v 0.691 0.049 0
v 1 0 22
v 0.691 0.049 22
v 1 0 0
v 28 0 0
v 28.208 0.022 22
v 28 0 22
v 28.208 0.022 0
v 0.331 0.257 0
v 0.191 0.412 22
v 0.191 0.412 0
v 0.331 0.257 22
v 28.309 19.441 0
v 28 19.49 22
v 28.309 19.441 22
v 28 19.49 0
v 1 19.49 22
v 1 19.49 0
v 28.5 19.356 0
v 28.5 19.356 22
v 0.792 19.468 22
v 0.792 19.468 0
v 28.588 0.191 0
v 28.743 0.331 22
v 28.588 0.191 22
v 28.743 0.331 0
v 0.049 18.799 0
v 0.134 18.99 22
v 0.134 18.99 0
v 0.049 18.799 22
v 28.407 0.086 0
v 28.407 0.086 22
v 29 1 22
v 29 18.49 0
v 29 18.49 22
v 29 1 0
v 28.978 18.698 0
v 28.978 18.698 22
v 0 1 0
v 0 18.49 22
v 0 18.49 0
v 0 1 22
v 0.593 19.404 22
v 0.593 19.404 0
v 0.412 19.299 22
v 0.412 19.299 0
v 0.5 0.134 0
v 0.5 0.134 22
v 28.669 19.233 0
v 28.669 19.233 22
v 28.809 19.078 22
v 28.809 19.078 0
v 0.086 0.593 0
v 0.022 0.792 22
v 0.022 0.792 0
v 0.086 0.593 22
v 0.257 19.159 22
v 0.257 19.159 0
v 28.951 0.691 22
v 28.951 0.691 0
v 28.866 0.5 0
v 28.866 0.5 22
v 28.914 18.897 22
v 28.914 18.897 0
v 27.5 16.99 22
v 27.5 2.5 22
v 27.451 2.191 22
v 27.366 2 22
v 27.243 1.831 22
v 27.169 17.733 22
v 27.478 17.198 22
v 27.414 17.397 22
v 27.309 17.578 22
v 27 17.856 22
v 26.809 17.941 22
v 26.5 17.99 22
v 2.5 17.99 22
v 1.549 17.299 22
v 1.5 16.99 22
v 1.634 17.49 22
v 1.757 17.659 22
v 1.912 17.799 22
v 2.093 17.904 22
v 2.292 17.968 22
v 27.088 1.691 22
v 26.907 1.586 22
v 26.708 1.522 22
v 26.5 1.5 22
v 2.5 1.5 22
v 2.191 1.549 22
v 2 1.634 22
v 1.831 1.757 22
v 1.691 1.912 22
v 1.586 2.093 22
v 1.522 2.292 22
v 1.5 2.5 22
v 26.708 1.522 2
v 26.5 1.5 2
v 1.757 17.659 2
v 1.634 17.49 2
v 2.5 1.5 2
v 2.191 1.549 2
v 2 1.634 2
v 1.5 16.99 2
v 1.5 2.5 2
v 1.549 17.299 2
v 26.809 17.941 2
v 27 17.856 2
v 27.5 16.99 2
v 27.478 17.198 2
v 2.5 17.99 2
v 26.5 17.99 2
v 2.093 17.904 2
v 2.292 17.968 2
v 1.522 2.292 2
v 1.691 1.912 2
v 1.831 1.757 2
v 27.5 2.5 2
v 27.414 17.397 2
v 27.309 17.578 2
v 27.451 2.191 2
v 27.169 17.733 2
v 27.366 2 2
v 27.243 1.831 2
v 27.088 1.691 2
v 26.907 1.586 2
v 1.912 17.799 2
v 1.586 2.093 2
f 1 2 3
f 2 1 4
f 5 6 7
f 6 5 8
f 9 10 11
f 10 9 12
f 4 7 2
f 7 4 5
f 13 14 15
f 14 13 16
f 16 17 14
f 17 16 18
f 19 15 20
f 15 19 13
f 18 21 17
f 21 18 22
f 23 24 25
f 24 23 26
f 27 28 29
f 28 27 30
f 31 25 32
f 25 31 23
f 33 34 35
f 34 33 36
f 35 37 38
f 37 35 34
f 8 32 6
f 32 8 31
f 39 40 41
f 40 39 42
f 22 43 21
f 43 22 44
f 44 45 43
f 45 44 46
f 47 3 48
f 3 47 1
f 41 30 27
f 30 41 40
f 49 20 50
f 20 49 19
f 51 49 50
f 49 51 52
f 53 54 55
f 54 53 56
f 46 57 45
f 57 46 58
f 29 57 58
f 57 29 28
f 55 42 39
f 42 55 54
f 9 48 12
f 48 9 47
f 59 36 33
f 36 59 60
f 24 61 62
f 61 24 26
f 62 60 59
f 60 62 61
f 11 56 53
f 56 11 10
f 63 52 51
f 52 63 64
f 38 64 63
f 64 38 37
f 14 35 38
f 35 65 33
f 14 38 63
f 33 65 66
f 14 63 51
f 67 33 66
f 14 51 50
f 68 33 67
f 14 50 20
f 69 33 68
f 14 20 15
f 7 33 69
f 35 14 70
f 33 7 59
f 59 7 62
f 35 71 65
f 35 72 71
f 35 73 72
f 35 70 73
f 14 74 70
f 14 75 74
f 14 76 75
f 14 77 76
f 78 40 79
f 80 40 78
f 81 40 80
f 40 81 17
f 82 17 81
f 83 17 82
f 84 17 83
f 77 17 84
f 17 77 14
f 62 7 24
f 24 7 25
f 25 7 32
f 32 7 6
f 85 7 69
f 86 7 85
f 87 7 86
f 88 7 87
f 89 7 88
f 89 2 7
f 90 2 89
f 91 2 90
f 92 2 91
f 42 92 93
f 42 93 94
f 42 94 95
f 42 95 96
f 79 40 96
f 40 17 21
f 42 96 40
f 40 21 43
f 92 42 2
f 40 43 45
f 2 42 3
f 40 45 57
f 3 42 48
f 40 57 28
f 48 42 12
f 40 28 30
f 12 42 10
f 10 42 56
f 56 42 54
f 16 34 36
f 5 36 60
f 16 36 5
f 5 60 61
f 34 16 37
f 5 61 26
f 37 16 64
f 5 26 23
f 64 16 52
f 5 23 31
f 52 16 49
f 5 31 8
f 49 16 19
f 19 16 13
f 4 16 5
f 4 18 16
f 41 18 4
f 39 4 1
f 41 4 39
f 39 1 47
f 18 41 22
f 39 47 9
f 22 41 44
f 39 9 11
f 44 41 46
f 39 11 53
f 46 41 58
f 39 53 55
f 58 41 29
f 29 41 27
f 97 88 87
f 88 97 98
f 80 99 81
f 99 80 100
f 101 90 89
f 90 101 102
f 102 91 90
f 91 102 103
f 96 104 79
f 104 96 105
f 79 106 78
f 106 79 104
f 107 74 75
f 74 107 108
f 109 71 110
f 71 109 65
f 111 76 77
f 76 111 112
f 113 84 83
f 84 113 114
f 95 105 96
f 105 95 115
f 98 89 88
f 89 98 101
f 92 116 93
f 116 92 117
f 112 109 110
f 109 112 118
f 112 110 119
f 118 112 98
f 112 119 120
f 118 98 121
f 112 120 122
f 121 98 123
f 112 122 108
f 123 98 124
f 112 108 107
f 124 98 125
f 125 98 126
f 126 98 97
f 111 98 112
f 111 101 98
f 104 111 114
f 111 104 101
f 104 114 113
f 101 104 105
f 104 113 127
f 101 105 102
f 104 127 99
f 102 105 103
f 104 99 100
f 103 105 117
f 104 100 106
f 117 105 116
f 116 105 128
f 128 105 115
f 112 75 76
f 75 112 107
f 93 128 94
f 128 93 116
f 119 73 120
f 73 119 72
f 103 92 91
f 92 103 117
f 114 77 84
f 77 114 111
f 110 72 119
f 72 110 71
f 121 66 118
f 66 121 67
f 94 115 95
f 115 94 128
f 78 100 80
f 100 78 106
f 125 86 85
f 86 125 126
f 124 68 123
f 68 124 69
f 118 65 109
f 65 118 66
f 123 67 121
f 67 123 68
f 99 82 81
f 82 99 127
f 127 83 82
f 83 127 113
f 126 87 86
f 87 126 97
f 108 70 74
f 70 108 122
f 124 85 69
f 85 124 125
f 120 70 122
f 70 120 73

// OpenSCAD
// file: myTools.scad
module tube (r = 0, d = 0, l = 0, 
            thick = 0, 
            bCentered = true, 
            taper_pct = 0, 
            circlip = false) // r=radius d=dia l=length 
{
    assert( r != 0 || d != 0, "specify one of radius or diameter");
    assert( l != 0 , "tube: need length 'l' to be non zero");
    assert( thick != 0, "wall thickness cannot be zero");

    punch = $preview ? .2 : 0; // stop funny view artifact

    dia = r ? r * 2 : d;

    od = ((thick > 0) ? dia + thick * 2 : dia);
    id = (thick > 0) ? dia             : dia  + thick *2; 

    
    
    if (thick > 0)
        echo ("tube\tMIN id = ", id, "od = ", od, "wall = ", thick, "center= ", bCentered);
    else
        echo ("tube\tMAX od = ", od, "id = ", id, "wall = ", thick, "center= ", bCentered);

    echo ("tube\tHeigth = ", l);
        
    if (taper_pct != 0)
    {
        echo ("tube\t*** OD expanded by ", taper_pct, "%, : bottom od = ", od * (1. +taper_pct/100), "top od = ", od);
    }
    
    assert(dia || dia < 0, "tube : missing r or d ");
    
    // if taper_pct specified, the base will always be closest to 0,0,0
    translate([ 0, 0, taper_pct == 0 ? 0: bCentered ? l/2:l  ])
    rotate([0, taper_pct == 0 ? 0 : 180, 0 ])

    difference()
    {
        // make a reese's cup
        {
            color("YELLOW", .3)
            linear_extrude(height= l, scale = 1 + taper_pct/100)
                difference()
                {
                    circle(d = od);
                    circle(d = .5);
                }
        }
    
     // hollow out reessed cup
     color("GREEN")
     translate([0, 0, -punch/2])
     linear_extrude(height= l+ punch*2, $fn=100)
     {
        circle(d = id);
        if (circlip) #square([1 + punch, od ]);
     }
    
    }
}
//==============================================================================
        
module abox (dims, 
            thick = 0, 
            bCentered = true, 
            round_out = 0, 
            round_in = 0, 
            bSolid = false,
            bHollow = false,
            elevator = 0)   // move bottom up by X
{
    punch = $preview ? .1 : 0; // stop funny view artifact
    
    assert(thick != 0, "Thick must be specified. +=outside dim, -= inside dims");
    assert(dims.z > thick, "wall thickness too large for depth of box");

    wall2 = abs(thick) * 2; // 2 walls in each direction
    wall = wall2 / 2;
    
    // box either grows inward (thick < 0) or outward (thick > 0)  from dims
    fat = dims + [ wall2, wall2, wall];
    thin = dims - [ wall2, wall2, wall];
    
    offset = (thick > 0 && bCentered == false) ? wall : 0;
    
    //echo ("abox : adjusting x,y,z by ", offset, " to move origin from  center to 0,0,0");
    translate( [ bCentered ? 0 : dims.x /2 + offset, bCentered ? 0 : dims.y /2 + offset, bCentered ? 0 : dims.z /2 + offset/2]) 
    {
        if (thick > 0)
        {   
            // wall grows outwards from users dim
            echo ("making a box, MAX INSIDE dim = ", dims, "a wall=", thick, "mm ... max outside = ", fat, " mm");
        }
        else
        {
            // wall grows inward from users dime
            echo ("making a box, MAX OUTSIDE dim = ", dims, "a wall=", thick, "mm ... min inside = ", thin, " mm");
        }
        
        // linear extrude alway works in the positive x/y plane an goes upward.
        // after calc, re-center about 0,0,0 where a bCentered cube would be
        
        translate([ 0, 0, thick > 0  ? -fat.z/2 : -dims.z/2 ])
        difference()
        {
            echo ("round_out = ", round_out);

            // MAKE SOLID BOX --------------------------------------
            router_outside = round_out ? round_out : 0;
            x = thick > 0  ? fat.x - router_outside : dims.x - router_outside;
            y = thick > 0  ? fat.y - router_outside : dims.y - router_outside;


            // MAKE PUCHNED INSIDE
            // using 'offset' it will add r on all dimensions, then round., 
            // so now you have fatter perimeter than you started with :(
            //  but at least the corners are round.
            
            // Compensate by shrinking dimension by r, 
            // and then by calling offset, offset will then add it back

            color("YELLOW", .2)

            linear_extrude(thick > 0  ? fat.z : dims.z)
            if (round_out)
            {
                offset( r= round_out, $fn=30)
                square( [x - router_outside, y - router_outside], true);
            }
            else square( [x - router_outside, y - router_outside], true);
           
            // time to punch out the inside if requested.
            if (bSolid == false)
            {
                hollow_offset = bHollow ? fat.z/2 + .2  : dims.z/2 +.2;
                // punching out inside. its either dims or thin.
                router_inside = round_in;
                echo ("round_in = ", router_inside);
                xi = thick > 0  ? dims.x  : thin.x;
                yi = thick > 0  ? dims.y : thin.y ;

                color("GREEN")

                // move 'punch' up if you need a bottom else zero (hollowed out)

                translate([ 0,0, bHollow ? -.1 : wall + elevator]) 
                linear_extrude(thick > 0  ? fat.z - wall  + hollow_offset : dims.z - wall + hollow_offset)
                //#linear_extrude(fat.z - wall  + hollow_offset)
                
                if (round_in) 
                {
                    offset( r= round_in, $fn=30)
                    square( [ xi - router_inside, yi - router_inside], true);
                }
                else
                    square( [ xi, yi], true);
            }
        }
    }
 }


// 50x25x10 box walls grow inward (-2). on center origin midpoint
// rounded outside (default), sharp corner inside(default), bCentered about 0,0,0
//color("GREEN", .9)
//abox([50,25, 10], -2, true); 


// 50x25x10 box walls grow inward (-2). on center origin midpoint
// sharp outside corners, rounded inside corners. Sit on x,y plane
color("BLUE", .9)
abox([50,20, 10], +2, round_in=2, bCentered = false);  // 50x25x10 box inside dim origin has 0,0


// 50x25x10 box walls grow inward (-2). on center origin midpoint
// sharp corners inside and out. sits on x,y plane
color("GREY", .9)//
translate([ 55, 0, 0])      
abox([50,20, 10], +2, round_out=3, false);

color("PINK", .9)//
translate([ 115, 10, 10])      
abox([86.66, 56.865, 5], -5, bHollow = true, bCentered = false); 

color("GREEN", .9)//
translate([ 140, 10, -10])      
abox([86.66, 56.865, 5], 3, bHollow = true, bCentered = false); 

/*
// 50x25x10 box walls grow inward (-2). on center origin midpoint
// round corners outside and SOLID
color("BLUE", .9)//
translate([ 55, 0, 0])      
abox([50,25, 10], +2, round_out=2, round_in=0, false, bSolid = true); // 50x25x10 box outside dim origin is 0,0
*/

//translate ([-30,-30, 0])
{
/*
    // tube outer dia  20, inner dia = (20 - 8)
    color("PINK")
    tube (d = 20, l = 20, thick = -8, bCentered = false);

    // tube, inner dia = (2* 10), outer dia = ((2*10) + 2) 
    color("PURPLE", .3)
    tube (r = 10, l = 20, thick = +2, bCentered= true);
*/
/*
    tube (d = 60, l = 20, thick = -6, bCentered = false);

    translate([0, 0, 50])
    tube (d = 60, l = 20, thick = -6, bCentered = false, taper_pct = 20, circlip = true);
    //color("GREEN")
    //tube (d = 20, l = 20, thick = -2, bCentered = false, taper = 10, circlip = true);
*/

}
// main file
//use <otherPeoplesWork/threads-scad/threads.scad>
use <myTools.scad>


/* [Hidden] */

x = 25;   // SDCARD 
y = 2.07 * 7 + 1;      // SDCARD
z = 20;

$fn=60;   //circle quantize 360/10=36 degrees per side

wall = +2;

// container for the SDCARD
SDCARD_outside = [ x, y, z];

module build_SDCARD()
{
    // container for the SDCARD
    abox( SDCARD_outside, thick = +2, round_out=1, round_in=1, bCentered = false);

 }

build_SDCARD();
 
